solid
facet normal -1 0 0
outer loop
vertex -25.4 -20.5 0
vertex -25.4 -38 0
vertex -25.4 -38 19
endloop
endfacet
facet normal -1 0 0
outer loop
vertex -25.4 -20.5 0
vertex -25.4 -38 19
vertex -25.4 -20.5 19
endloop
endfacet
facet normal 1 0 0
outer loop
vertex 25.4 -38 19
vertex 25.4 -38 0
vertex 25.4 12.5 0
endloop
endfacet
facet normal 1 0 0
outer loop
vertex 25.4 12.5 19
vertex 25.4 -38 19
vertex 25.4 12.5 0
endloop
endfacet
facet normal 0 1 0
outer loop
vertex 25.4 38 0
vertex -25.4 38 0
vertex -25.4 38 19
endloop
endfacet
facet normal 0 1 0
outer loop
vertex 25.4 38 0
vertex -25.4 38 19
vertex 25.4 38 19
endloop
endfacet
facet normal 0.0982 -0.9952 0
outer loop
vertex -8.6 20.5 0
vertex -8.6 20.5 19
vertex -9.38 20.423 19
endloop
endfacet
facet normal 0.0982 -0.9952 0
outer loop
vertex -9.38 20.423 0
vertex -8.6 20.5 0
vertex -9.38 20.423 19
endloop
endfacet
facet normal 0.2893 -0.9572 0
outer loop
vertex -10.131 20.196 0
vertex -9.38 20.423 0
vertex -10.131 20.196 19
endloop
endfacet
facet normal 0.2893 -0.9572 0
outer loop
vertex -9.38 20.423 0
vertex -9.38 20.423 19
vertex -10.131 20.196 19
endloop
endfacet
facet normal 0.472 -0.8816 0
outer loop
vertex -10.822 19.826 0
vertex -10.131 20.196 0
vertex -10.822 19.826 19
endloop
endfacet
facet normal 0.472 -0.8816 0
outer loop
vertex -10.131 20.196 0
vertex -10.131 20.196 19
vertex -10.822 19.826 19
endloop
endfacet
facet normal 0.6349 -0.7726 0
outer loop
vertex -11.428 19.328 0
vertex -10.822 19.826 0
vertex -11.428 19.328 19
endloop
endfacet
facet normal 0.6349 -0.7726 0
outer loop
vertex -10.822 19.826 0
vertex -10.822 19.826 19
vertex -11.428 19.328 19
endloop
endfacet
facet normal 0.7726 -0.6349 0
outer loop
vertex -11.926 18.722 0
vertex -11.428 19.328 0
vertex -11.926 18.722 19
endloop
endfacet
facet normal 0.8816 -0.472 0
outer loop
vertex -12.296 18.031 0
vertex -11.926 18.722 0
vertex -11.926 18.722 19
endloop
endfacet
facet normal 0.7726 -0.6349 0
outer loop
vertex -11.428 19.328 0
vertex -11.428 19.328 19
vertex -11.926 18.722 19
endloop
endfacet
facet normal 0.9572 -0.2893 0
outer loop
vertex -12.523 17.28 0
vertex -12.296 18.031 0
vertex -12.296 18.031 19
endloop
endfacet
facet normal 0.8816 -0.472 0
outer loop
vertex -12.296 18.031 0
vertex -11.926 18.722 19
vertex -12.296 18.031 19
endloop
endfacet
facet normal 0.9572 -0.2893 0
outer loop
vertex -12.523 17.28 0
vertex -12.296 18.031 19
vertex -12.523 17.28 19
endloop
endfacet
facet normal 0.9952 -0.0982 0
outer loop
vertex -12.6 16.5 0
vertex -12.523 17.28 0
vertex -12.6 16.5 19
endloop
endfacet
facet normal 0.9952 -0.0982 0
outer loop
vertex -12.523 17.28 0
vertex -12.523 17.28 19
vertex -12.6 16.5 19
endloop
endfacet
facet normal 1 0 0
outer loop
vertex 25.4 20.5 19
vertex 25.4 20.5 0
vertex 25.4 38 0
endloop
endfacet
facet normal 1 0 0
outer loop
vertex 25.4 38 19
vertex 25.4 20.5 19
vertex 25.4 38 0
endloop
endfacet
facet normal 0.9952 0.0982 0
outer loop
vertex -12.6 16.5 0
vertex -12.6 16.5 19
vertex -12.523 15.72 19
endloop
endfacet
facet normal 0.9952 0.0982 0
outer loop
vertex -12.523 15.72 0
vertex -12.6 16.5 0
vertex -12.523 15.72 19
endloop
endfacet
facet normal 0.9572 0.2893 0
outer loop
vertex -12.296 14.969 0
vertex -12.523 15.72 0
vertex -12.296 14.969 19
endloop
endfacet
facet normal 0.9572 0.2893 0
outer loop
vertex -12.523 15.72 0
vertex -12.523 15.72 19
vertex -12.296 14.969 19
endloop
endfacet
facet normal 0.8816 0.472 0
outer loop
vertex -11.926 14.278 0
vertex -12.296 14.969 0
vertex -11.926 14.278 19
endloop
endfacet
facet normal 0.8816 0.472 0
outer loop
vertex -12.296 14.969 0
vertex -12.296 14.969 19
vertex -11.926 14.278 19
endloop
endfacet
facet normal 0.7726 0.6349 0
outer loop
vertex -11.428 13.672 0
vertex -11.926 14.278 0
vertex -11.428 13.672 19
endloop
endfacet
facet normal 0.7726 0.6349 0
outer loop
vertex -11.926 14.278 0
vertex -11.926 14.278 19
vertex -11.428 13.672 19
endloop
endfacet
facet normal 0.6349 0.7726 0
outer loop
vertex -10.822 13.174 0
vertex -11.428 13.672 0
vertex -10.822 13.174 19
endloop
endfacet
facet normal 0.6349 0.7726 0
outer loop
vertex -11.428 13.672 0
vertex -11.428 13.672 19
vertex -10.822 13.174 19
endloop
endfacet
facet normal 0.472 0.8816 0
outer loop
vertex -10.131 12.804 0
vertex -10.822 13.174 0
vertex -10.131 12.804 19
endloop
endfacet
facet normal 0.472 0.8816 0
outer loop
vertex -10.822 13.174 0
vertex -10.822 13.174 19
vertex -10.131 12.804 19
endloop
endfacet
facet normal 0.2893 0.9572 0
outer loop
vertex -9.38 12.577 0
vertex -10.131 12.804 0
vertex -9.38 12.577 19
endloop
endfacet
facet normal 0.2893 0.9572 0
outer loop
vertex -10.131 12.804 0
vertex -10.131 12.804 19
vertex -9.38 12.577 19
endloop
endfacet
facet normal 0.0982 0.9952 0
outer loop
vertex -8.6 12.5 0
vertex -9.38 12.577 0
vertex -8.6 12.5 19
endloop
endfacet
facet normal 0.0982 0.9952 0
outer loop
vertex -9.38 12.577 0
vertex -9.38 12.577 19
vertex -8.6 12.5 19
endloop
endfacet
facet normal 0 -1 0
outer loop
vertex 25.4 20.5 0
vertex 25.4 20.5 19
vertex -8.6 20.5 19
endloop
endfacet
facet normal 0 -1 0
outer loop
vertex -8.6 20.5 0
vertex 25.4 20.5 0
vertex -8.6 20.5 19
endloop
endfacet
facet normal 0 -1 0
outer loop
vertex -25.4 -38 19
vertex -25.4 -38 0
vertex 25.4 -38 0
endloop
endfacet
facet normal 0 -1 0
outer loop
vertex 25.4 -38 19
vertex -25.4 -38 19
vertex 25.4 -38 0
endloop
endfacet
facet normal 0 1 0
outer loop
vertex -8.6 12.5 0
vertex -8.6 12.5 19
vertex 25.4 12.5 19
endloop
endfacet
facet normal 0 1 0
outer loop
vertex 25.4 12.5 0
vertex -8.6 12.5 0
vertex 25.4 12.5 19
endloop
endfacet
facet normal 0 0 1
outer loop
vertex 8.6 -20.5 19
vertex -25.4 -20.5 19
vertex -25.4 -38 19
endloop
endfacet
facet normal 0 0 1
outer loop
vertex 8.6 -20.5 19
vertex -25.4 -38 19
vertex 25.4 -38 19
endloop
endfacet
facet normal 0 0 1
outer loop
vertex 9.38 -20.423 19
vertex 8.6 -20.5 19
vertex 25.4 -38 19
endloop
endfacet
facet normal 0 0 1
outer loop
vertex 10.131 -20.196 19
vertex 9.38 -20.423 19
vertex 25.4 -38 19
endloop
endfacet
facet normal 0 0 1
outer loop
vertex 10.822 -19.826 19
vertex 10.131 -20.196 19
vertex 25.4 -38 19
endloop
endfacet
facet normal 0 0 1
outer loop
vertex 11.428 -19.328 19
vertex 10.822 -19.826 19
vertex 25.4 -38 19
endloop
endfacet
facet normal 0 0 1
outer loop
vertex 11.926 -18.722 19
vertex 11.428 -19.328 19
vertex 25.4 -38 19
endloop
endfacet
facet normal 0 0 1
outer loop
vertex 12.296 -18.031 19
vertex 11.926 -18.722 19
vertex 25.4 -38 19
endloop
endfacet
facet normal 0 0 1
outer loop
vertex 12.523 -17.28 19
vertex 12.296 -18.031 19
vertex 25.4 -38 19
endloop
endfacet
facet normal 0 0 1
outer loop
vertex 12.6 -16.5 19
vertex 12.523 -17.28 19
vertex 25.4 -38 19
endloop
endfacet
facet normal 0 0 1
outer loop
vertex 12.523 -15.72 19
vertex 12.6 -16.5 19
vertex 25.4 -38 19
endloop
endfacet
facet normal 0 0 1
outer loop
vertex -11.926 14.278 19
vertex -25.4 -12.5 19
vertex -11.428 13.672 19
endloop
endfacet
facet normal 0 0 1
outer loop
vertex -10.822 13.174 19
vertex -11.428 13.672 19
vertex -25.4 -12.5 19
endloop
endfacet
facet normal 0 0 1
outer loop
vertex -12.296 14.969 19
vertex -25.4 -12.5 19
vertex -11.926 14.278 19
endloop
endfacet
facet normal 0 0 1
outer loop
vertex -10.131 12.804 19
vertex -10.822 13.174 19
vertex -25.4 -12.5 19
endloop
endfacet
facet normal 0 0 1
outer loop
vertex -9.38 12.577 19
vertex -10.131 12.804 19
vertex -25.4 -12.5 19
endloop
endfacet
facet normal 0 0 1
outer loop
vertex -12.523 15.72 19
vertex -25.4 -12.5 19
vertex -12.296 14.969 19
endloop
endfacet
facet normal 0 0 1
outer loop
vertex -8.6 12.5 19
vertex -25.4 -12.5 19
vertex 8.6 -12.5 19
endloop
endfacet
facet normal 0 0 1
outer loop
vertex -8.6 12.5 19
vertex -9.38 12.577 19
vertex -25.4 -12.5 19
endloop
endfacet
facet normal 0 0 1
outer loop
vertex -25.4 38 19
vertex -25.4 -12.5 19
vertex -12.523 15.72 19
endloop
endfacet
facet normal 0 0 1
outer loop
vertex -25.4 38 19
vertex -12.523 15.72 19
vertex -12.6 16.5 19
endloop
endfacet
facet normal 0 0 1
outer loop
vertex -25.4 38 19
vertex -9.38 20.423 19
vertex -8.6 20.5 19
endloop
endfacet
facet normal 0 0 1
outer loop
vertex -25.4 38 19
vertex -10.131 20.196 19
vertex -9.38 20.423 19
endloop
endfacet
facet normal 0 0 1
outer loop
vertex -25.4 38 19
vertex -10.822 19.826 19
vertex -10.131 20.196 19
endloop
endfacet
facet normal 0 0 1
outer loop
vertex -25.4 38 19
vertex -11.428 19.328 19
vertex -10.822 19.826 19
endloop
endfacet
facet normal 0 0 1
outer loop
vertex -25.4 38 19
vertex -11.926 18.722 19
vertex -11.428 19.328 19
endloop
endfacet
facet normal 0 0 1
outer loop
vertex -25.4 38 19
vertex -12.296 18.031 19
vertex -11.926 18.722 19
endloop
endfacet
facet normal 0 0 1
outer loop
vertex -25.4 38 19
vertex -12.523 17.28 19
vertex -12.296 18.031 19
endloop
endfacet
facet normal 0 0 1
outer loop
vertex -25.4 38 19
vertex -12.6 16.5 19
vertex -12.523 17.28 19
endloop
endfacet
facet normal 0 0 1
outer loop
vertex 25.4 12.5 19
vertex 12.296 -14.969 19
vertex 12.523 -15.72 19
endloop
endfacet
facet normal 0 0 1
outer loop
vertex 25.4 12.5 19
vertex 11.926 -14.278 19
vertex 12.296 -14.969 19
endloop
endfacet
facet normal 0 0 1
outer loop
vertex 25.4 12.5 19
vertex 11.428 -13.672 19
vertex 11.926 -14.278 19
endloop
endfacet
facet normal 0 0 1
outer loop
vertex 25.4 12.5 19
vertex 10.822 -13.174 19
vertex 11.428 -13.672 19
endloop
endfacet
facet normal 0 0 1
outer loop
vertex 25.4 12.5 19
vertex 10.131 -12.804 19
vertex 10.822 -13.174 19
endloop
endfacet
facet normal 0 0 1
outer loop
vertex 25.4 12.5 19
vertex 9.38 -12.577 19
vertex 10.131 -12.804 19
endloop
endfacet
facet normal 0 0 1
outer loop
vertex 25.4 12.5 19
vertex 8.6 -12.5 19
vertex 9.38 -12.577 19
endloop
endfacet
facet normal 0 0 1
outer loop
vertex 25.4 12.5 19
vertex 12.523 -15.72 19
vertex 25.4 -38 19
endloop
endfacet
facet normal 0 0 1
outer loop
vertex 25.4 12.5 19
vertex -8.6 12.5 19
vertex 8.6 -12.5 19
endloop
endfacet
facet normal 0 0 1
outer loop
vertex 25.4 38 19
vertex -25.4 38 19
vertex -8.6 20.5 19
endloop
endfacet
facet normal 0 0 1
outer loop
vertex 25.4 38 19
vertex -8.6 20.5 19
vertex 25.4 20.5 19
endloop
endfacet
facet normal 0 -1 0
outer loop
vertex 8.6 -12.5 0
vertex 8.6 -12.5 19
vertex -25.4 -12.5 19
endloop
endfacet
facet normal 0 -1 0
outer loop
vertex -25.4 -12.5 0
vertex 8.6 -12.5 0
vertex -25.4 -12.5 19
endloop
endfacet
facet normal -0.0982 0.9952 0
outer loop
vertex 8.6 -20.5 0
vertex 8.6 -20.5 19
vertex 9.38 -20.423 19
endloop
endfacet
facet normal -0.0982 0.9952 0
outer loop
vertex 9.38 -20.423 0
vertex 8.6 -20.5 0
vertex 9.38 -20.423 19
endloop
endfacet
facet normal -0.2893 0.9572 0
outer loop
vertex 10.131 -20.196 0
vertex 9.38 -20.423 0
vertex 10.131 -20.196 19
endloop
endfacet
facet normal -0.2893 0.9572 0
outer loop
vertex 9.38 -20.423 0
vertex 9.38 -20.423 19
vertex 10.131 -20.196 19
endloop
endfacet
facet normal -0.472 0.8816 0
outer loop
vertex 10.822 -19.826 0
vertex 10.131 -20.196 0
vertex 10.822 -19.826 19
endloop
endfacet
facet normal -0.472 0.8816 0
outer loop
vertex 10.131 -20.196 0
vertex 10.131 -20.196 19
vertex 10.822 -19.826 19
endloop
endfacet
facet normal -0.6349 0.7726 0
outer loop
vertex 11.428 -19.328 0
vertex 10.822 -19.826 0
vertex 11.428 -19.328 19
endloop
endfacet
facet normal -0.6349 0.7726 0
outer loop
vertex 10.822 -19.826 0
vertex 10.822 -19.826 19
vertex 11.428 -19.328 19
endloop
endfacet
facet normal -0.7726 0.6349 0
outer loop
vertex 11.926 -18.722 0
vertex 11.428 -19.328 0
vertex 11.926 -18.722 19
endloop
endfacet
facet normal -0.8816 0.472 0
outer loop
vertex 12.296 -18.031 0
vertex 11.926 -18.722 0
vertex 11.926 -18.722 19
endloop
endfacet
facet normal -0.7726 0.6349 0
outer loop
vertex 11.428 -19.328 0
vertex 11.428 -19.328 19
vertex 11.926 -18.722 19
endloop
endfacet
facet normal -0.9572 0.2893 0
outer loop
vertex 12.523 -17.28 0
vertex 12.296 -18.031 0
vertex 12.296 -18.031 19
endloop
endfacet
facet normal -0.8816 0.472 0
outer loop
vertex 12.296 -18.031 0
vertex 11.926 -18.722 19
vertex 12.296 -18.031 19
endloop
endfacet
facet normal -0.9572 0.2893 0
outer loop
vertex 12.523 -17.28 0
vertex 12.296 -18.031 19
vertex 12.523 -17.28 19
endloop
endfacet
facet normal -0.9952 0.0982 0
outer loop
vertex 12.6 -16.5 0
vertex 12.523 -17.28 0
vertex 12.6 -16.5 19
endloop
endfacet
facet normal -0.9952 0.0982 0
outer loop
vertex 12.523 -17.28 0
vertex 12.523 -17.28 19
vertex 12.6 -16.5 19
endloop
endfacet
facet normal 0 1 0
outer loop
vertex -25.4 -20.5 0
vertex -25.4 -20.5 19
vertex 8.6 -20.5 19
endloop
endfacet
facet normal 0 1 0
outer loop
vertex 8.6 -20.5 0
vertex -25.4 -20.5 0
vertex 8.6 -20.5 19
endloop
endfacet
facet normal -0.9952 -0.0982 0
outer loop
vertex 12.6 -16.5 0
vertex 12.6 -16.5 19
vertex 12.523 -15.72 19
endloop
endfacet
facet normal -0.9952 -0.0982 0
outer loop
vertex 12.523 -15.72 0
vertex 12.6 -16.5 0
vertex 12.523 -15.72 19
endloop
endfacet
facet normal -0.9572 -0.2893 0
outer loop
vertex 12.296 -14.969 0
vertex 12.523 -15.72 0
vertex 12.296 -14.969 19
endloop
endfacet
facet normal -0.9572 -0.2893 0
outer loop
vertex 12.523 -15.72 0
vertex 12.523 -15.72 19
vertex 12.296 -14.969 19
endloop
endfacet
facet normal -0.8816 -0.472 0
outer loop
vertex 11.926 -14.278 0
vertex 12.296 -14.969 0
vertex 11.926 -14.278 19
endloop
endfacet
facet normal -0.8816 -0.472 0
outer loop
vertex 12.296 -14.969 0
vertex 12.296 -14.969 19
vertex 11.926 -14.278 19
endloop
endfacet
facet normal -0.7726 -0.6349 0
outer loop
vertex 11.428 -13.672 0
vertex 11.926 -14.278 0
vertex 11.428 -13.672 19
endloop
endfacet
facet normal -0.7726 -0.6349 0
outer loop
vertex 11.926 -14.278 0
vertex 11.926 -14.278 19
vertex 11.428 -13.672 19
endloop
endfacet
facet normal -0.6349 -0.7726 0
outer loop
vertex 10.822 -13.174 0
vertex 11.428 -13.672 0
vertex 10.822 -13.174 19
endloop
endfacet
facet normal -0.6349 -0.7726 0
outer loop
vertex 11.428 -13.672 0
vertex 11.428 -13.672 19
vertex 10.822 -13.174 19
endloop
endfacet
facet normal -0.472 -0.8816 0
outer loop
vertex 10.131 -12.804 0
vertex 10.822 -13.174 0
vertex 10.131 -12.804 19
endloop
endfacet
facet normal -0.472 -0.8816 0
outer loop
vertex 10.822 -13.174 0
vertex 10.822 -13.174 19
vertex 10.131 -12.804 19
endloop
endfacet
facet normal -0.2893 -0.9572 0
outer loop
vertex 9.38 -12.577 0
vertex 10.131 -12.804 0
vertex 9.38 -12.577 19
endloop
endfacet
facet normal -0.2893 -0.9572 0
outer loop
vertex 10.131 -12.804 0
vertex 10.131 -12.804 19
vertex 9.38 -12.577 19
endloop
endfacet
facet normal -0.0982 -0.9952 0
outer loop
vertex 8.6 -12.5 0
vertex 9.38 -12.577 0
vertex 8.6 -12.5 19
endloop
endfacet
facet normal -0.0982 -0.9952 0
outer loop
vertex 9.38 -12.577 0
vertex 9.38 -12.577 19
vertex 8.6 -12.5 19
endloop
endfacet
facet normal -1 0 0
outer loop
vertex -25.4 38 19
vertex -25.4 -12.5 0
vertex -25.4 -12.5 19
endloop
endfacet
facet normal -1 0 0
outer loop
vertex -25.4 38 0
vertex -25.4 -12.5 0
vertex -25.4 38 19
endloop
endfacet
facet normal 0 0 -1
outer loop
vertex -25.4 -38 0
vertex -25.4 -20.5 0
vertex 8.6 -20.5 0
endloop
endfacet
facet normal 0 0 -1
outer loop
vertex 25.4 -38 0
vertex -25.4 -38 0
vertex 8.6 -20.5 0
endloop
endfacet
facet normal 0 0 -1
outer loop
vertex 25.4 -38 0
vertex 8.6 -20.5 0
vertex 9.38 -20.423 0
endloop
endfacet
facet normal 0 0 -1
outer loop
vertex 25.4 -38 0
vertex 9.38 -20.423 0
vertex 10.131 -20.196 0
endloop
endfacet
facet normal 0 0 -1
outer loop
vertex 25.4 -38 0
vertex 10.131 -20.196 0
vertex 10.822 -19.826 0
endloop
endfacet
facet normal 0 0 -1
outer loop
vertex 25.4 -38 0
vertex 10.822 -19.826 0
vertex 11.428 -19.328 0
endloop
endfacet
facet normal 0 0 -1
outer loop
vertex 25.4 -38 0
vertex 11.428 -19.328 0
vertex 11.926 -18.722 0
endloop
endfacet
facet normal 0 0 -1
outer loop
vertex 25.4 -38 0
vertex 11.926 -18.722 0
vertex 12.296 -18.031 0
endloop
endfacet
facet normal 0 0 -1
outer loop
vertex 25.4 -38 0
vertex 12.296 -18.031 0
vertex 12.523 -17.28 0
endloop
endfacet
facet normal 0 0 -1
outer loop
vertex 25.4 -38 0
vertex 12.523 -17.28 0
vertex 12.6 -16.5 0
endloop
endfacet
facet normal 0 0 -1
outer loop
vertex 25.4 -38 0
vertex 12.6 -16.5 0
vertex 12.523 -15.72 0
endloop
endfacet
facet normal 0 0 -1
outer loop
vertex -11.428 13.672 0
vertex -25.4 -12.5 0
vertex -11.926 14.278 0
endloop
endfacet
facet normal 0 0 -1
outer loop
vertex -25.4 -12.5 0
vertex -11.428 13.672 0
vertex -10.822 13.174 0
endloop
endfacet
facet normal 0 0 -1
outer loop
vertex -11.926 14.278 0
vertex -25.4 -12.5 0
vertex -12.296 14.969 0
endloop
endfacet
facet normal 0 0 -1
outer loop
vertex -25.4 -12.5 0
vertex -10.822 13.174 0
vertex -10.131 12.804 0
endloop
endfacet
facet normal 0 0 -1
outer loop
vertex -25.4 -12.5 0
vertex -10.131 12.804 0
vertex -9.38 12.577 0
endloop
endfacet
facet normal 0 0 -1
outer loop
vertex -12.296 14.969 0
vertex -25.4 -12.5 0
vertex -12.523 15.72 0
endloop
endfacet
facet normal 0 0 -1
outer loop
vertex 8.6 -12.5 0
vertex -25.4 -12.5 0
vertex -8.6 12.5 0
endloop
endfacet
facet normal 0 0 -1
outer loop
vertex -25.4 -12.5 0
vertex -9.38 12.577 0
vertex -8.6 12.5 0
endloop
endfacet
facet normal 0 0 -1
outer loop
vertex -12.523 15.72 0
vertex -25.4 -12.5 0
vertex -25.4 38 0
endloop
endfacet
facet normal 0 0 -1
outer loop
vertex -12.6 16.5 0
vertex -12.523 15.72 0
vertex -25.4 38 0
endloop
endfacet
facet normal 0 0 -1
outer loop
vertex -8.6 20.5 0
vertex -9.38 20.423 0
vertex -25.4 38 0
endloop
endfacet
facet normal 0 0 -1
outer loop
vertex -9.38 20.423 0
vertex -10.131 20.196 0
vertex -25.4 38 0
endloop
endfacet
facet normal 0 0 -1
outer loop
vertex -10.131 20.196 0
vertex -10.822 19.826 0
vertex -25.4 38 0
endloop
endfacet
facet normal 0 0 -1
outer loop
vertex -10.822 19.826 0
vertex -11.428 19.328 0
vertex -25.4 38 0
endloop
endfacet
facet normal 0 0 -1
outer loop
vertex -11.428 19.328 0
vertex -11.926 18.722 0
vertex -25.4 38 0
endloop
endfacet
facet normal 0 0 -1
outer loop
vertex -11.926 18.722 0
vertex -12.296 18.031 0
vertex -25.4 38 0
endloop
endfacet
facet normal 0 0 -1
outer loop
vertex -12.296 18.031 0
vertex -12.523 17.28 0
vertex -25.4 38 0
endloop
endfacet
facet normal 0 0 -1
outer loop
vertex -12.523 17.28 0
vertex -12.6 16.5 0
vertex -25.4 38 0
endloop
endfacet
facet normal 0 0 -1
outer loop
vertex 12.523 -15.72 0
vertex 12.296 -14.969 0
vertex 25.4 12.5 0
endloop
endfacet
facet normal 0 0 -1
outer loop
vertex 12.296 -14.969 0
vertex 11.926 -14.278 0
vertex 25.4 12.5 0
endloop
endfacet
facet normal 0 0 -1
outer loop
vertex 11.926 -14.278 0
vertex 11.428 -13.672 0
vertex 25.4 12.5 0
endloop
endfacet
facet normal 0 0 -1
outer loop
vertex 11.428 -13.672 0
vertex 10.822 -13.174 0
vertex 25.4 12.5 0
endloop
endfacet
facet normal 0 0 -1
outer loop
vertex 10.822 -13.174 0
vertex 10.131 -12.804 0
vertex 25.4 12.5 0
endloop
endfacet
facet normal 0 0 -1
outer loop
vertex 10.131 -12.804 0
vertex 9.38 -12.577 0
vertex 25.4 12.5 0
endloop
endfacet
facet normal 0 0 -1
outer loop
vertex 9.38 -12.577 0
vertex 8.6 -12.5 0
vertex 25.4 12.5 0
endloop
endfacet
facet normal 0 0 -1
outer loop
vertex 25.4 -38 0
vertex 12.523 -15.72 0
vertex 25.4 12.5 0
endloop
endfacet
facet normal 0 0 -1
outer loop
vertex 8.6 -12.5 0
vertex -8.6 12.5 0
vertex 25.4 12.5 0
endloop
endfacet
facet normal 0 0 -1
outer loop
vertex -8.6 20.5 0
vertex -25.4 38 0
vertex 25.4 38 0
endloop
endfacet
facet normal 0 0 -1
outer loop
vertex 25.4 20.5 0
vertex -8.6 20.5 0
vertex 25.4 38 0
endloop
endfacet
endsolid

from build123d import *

# Parameters (mm, degrees)
F0_W     = 50.8
F0_H     = 76
F1_DEPTH = 19
F3_DEPTH = 19.001
F5_DEPTH = 19.001


with BuildPart() as f1:
    # F0 (on Top) → F1 (new body)
    with BuildSketch(Plane.XY):
        Rectangle(F0_W, F0_H)
    extrude(amount=F1_DEPTH)

    # F2 (on face) → F3 (cut, through all)
    with BuildSketch(Plane.XY.offset(19)):
        with BuildLine():
            Line((-25.4, -12.5), (-25.4, -20.5))
            Line((-25.4, -20.5), (8.6, -20.5))
            ThreePointArc((8.6, -20.5), (11.428427, -19.328427), (12.6, -16.5))
            ThreePointArc((12.6, -16.5), (11.428427, -13.671573), (8.6, -12.5))
            Line((8.6, -12.5), (-25.4, -12.5))
        make_face()
    extrude(amount=-F3_DEPTH, mode=Mode.SUBTRACT)

    # F4 (on face) → F5 (cut, through all)
    with BuildSketch(Plane.XY.offset(19)):
        with BuildLine():
            Line((25.4, 12.5), (25.4, 20.5))
            Line((25.4, 20.5), (-8.6, 20.5))
            ThreePointArc((-8.6, 20.5), (-11.428427, 19.328427), (-12.6, 16.5))
            ThreePointArc((-12.6, 16.5), (-11.428427, 13.671573), (-8.6, 12.5))
            Line((-8.6, 12.5), (25.4, 12.5))
        make_face()
    extrude(amount=-F5_DEPTH, mode=Mode.SUBTRACT)


solid = f1.part
